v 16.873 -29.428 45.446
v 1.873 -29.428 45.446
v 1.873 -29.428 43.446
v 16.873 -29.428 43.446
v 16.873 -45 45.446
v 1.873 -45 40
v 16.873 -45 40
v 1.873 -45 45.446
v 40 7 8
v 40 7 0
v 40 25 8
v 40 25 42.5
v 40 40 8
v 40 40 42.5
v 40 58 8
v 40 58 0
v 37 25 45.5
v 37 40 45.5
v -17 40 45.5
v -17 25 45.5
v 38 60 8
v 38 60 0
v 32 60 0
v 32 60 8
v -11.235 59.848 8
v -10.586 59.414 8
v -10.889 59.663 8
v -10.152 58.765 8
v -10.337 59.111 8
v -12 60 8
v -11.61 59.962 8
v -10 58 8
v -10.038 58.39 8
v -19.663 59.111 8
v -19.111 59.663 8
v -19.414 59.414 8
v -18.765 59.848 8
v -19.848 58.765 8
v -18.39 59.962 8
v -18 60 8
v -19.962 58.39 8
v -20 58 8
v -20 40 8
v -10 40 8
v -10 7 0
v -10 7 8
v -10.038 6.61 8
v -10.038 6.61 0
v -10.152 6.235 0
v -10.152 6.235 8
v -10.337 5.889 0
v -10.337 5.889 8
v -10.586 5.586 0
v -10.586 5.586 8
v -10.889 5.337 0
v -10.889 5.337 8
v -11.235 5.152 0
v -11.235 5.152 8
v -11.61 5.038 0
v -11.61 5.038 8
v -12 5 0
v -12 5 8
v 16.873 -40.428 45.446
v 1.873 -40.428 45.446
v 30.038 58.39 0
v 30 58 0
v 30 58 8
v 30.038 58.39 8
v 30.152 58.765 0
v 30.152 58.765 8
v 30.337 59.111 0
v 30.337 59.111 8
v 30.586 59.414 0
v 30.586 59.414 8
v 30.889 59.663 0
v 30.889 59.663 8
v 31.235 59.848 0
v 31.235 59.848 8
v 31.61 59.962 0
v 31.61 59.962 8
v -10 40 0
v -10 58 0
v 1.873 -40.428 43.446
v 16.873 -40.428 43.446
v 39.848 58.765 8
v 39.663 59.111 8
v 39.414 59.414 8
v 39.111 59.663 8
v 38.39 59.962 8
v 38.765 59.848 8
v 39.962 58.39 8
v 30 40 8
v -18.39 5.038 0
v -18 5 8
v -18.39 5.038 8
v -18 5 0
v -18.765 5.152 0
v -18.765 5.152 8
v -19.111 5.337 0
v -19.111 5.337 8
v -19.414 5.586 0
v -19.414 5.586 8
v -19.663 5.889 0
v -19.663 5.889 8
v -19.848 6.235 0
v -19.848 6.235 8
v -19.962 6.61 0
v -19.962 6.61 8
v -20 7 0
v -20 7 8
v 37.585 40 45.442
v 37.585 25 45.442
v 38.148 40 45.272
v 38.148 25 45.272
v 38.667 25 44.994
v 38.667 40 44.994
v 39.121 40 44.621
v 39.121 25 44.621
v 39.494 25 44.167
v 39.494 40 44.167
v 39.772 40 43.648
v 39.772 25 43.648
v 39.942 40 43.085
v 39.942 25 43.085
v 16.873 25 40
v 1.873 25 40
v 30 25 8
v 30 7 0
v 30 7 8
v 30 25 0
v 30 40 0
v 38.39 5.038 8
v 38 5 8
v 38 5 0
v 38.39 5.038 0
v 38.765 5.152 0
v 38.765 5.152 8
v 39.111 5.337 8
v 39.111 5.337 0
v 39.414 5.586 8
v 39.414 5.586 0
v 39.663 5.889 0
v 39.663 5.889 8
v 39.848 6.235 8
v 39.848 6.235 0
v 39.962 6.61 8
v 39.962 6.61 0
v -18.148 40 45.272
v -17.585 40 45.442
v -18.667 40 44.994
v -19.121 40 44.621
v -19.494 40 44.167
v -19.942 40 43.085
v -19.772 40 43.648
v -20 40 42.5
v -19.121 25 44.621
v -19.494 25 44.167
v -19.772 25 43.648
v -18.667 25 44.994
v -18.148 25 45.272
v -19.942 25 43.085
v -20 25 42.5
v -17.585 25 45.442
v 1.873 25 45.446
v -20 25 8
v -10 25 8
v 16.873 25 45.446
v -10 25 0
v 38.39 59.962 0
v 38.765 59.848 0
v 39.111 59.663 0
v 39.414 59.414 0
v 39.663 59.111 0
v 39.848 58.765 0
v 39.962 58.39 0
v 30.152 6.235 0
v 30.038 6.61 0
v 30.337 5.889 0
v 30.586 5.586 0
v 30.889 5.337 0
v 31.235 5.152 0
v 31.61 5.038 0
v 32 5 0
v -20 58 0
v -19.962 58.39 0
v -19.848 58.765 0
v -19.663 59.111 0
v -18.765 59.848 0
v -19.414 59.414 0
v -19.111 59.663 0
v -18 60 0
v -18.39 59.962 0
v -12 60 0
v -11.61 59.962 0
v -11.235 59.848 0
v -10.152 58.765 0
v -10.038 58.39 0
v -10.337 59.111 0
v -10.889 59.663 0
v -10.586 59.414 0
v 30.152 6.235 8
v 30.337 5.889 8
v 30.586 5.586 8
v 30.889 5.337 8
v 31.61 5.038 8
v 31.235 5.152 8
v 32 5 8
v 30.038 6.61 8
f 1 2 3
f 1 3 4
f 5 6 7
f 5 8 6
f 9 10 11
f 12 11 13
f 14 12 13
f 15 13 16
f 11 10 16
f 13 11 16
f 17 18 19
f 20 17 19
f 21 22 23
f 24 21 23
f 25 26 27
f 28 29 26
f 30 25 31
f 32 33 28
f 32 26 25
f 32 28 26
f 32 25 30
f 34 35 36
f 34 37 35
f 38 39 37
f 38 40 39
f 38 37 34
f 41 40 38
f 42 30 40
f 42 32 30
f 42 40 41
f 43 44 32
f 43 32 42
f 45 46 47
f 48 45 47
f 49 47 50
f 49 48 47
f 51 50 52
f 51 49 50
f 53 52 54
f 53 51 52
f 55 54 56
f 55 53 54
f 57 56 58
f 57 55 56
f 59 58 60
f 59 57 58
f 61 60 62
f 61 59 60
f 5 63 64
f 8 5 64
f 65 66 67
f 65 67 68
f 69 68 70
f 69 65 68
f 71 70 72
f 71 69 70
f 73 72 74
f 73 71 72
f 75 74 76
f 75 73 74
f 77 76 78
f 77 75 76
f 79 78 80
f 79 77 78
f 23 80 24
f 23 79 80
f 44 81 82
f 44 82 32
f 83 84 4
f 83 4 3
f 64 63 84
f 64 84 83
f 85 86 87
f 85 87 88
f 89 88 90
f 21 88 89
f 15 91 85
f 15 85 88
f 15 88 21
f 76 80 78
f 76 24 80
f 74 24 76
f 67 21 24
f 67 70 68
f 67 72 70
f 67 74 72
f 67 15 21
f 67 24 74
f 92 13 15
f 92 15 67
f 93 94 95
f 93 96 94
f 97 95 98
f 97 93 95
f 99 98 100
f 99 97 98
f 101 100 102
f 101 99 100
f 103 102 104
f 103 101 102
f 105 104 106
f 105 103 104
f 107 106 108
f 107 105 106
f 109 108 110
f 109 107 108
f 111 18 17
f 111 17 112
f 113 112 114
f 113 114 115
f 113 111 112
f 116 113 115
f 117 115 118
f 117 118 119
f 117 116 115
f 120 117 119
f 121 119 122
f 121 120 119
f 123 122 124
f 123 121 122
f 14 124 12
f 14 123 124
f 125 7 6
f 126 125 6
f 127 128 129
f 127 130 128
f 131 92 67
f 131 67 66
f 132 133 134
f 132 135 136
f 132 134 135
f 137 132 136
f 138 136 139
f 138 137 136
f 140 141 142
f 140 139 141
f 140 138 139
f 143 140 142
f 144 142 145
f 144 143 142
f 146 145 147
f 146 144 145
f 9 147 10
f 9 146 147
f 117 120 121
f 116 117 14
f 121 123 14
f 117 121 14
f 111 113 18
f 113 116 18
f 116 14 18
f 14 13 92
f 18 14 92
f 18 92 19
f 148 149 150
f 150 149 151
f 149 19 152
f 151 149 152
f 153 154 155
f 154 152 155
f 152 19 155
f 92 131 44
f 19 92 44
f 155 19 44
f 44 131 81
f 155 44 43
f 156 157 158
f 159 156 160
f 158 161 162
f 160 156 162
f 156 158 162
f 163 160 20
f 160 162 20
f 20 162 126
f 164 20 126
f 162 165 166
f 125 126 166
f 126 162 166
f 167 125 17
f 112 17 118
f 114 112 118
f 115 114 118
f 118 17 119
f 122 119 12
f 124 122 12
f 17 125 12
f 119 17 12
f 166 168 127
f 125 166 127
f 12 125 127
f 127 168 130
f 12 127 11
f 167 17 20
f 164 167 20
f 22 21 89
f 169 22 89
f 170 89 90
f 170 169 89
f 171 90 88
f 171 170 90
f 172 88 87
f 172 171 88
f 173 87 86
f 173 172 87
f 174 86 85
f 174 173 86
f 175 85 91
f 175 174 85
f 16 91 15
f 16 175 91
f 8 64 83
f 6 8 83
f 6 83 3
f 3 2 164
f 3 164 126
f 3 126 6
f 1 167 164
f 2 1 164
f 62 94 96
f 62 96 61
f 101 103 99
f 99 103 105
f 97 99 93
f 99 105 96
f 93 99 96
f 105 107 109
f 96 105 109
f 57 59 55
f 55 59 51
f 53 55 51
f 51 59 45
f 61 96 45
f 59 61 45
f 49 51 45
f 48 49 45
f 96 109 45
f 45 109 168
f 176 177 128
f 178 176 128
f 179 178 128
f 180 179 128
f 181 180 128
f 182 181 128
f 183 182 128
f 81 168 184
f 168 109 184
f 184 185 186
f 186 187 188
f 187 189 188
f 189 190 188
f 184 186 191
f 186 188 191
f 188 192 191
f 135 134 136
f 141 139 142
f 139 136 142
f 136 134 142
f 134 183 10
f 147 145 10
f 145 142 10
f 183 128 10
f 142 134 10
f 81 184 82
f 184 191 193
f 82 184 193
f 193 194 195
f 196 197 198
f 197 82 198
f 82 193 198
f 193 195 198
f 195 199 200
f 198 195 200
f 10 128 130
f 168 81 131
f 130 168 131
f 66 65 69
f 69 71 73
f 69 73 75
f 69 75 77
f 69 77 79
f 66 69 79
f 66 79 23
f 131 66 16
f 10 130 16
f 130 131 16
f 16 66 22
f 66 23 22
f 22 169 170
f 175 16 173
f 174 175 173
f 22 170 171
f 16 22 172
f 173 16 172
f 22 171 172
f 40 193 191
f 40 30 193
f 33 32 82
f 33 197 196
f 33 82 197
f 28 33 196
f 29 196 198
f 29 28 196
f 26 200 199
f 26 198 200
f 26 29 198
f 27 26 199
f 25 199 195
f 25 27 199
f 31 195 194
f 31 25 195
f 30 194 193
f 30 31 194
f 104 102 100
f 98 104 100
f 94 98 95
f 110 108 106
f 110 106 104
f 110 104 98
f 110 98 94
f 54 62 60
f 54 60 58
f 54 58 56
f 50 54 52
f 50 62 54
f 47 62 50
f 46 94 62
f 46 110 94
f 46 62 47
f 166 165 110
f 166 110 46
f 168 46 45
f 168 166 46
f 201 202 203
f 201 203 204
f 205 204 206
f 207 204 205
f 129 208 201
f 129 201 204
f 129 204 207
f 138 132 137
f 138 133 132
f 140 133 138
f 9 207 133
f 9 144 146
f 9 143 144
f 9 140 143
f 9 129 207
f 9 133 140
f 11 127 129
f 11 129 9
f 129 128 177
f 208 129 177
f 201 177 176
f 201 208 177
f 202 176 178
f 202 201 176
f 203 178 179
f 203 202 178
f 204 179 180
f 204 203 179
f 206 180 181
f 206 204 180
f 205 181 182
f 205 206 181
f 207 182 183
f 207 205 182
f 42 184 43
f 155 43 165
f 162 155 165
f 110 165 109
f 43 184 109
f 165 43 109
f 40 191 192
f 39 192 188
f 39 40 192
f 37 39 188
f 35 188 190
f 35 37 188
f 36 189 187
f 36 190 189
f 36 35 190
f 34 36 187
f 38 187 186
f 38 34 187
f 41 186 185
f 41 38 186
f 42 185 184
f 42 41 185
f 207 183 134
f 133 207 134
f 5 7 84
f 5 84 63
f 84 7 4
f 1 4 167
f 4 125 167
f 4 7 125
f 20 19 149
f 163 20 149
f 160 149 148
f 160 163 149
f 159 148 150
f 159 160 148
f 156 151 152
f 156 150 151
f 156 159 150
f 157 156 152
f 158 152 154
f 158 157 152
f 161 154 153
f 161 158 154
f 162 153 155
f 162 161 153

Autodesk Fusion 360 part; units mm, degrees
sketch "Sketch1" plane through (0, 0, 0) normal (0, 0, 1) x (1, 0, 0)
  line L0 (-20, 40) -> (-19.9999, 40)
  line L1 (-19.9999, 10) -> (-20, 10)
  line L2 (-20, 40) -> (40, 40)
  line L3 (40, 40) -> (40, 25)
  line L4 (40, 25) -> (-20, 25)
  line L5 (-20, 25) -> (-20, 40)
  line L6 (20, 40) -> (40, 40)
  dimension "d12" = 60
extrude "Extrude6" add sketch "Sketch1" along normal blind 40
sketch "Sketch5" plane through (0, 25, 0) normal (0, -1, 0) x (1, 0, 0)
  line L0 (-20, 0) -> (40, 0)
  line L1 (40, 0) -> (40, 40)
  line L2 (40, 40) -> (-20, 40)
  line L3 (-20, 40) -> (-20, 0)
  line L4 (1.8726, 40) -> (16.8726, 40)
  line L5 (16.8726, 40) -> (16.8726, 45.446)
  line L6 (16.8726, 45.446) -> (1.8726, 45.446)
  line L7 (1.8726, 45.446) -> (1.8726, 40)
  point P0 (10, 40)
  dimension "d29" = 15
extrude "Extrude7" add sketch "Sketch5" along normal blind 70 contours L2 L4 L5 L6 L7
sketch "Sketch6" plane through (0, 0, 40) normal (0, 0, -1) x (-1, 0, 0)
  line L0 (20, 40) -> (20, 25)
  line L1 (20, 25) -> (-1.8726, 25)
  line L2 (-40, 25) -> (-40, 40)
  line L3 (-40, 40) -> (20, 40)
  line L4 (-1.8726, 25) -> (-16.8726, 25)
  line L5 (-16.8726, 25) -> (-40, 25)
extrude "Extrude8" add sketch "Sketch6" against normal blind 5.5
sketch "Sketch7" plane through (0, 25, 0) normal (0, -1, 0) x (1, 0, 0)
  line L0 (-20, 45.5) -> (-20, 0)
  line L1 (-20, 0) -> (40, 0)
  line L2 (40, 0) -> (40, 45.5)
  line L3 (-20, 8) -> (-10, 8)
  line L4 (-10, 8) -> (-10, 0)
  line L5 (-10, 0) -> (-20, 0)
  line L6 (-20, 0) -> (-20, 8)
  line L7 (30, 8) -> (40, 8)
  line L8 (40, 8) -> (40, 0)
  line L9 (40, 0) -> (30, 0)
  line L10 (30, 0) -> (30, 8)
  line L11 (16.8726, 45.446) -> (16.8726, 40)
  line L12 (1.8726, 40) -> (1.8726, 45.446)
  line L13 (40, 45.5) -> (-20, 45.5)
  line L14 (16.8726, 40) -> (1.8726, 40)
  line L15 (1.8726, 45.446) -> (16.8726, 45.446)
  dimension "d25" = 10
  dimension "d26" = 8
  dimension "d27" = 10
  dimension "d28" = 8
extrude "Extrude9" add sketch "Sketch7" along normal blind 20 contours L0 L1 L3 L4 L5 L6 | L1 L2 L7 L8 L9 L10
sketch "Sketch8" plane through (0, 40, 0) normal (0, 1, 0) x (-1, 0, 0)
  line L0 (-40, 0) -> (20, 0)
  line L1 (20, 0) -> (20, 45.5)
  line L2 (-40, 45.5) -> (-40, 0)
  line L3 (-40, 8) -> (-30, 8)
  line L4 (-30, 8) -> (-30, 0)
  line L5 (-30, 0) -> (-40, 0)
  line L6 (-40, 0) -> (-40, 8)
  line L7 (10, 8) -> (20, 8)
  line L8 (20, 8) -> (20, 0)
  line L9 (20, 0) -> (10, 0)
  line L10 (10, 0) -> (10, 8)
  line L11 (20, 45.5) -> (-40, 45.5)
  dimension "d34" = 10
  dimension "d35" = 8
  dimension "d36" = 8
  dimension "d37" = 10
extrude "Extrude10" add sketch "Sketch8" along normal blind 20 contours L0 L2 L3 L4 L5 L6 | L0 L1 L7 L8 L9 L10
sketch "Sketch10" plane through (0, 0, 45.446) normal (0, 0, 1) x (-1, 0, 0)
  line L0 (-1.8726, -25) -> (-1.8726, 45)
  line L1 (-1.8726, 45) -> (-16.8726, 45)
  line L2 (-16.8726, 45) -> (-16.8726, -25)
  line L3 (-16.8726, 40.4277) -> (-1.8726, 40.4277)
  line L4 (-1.8726, 40.4277) -> (-1.8726, 29.4277)
  line L5 (-1.8726, 29.4277) -> (-16.8726, 29.4277)
  line L6 (-16.8726, 29.4277) -> (-16.8726, 40.4277)
  line L7 (-16.8726, -25) -> (-1.8726, -25)
  dimension "d38" = 11
extrude "Extrude12" cut sketch "Sketch10" against normal blind 2 contours L0 L2 L3 L4 L5 L6
fillet "Fillet1" radius 3 2 edges at (40, 32.5, 45.5) (-20, 32.5, 45.5)
fillet "Fillet2" radius 2 8 edges at (40, 5, 4) (30, 5, 4) (40, 60, 4) (-10, 5, 4) (30, 60, 4) (-10, 60, 4) (-20, 60, 4) (-20, 5, 4)
